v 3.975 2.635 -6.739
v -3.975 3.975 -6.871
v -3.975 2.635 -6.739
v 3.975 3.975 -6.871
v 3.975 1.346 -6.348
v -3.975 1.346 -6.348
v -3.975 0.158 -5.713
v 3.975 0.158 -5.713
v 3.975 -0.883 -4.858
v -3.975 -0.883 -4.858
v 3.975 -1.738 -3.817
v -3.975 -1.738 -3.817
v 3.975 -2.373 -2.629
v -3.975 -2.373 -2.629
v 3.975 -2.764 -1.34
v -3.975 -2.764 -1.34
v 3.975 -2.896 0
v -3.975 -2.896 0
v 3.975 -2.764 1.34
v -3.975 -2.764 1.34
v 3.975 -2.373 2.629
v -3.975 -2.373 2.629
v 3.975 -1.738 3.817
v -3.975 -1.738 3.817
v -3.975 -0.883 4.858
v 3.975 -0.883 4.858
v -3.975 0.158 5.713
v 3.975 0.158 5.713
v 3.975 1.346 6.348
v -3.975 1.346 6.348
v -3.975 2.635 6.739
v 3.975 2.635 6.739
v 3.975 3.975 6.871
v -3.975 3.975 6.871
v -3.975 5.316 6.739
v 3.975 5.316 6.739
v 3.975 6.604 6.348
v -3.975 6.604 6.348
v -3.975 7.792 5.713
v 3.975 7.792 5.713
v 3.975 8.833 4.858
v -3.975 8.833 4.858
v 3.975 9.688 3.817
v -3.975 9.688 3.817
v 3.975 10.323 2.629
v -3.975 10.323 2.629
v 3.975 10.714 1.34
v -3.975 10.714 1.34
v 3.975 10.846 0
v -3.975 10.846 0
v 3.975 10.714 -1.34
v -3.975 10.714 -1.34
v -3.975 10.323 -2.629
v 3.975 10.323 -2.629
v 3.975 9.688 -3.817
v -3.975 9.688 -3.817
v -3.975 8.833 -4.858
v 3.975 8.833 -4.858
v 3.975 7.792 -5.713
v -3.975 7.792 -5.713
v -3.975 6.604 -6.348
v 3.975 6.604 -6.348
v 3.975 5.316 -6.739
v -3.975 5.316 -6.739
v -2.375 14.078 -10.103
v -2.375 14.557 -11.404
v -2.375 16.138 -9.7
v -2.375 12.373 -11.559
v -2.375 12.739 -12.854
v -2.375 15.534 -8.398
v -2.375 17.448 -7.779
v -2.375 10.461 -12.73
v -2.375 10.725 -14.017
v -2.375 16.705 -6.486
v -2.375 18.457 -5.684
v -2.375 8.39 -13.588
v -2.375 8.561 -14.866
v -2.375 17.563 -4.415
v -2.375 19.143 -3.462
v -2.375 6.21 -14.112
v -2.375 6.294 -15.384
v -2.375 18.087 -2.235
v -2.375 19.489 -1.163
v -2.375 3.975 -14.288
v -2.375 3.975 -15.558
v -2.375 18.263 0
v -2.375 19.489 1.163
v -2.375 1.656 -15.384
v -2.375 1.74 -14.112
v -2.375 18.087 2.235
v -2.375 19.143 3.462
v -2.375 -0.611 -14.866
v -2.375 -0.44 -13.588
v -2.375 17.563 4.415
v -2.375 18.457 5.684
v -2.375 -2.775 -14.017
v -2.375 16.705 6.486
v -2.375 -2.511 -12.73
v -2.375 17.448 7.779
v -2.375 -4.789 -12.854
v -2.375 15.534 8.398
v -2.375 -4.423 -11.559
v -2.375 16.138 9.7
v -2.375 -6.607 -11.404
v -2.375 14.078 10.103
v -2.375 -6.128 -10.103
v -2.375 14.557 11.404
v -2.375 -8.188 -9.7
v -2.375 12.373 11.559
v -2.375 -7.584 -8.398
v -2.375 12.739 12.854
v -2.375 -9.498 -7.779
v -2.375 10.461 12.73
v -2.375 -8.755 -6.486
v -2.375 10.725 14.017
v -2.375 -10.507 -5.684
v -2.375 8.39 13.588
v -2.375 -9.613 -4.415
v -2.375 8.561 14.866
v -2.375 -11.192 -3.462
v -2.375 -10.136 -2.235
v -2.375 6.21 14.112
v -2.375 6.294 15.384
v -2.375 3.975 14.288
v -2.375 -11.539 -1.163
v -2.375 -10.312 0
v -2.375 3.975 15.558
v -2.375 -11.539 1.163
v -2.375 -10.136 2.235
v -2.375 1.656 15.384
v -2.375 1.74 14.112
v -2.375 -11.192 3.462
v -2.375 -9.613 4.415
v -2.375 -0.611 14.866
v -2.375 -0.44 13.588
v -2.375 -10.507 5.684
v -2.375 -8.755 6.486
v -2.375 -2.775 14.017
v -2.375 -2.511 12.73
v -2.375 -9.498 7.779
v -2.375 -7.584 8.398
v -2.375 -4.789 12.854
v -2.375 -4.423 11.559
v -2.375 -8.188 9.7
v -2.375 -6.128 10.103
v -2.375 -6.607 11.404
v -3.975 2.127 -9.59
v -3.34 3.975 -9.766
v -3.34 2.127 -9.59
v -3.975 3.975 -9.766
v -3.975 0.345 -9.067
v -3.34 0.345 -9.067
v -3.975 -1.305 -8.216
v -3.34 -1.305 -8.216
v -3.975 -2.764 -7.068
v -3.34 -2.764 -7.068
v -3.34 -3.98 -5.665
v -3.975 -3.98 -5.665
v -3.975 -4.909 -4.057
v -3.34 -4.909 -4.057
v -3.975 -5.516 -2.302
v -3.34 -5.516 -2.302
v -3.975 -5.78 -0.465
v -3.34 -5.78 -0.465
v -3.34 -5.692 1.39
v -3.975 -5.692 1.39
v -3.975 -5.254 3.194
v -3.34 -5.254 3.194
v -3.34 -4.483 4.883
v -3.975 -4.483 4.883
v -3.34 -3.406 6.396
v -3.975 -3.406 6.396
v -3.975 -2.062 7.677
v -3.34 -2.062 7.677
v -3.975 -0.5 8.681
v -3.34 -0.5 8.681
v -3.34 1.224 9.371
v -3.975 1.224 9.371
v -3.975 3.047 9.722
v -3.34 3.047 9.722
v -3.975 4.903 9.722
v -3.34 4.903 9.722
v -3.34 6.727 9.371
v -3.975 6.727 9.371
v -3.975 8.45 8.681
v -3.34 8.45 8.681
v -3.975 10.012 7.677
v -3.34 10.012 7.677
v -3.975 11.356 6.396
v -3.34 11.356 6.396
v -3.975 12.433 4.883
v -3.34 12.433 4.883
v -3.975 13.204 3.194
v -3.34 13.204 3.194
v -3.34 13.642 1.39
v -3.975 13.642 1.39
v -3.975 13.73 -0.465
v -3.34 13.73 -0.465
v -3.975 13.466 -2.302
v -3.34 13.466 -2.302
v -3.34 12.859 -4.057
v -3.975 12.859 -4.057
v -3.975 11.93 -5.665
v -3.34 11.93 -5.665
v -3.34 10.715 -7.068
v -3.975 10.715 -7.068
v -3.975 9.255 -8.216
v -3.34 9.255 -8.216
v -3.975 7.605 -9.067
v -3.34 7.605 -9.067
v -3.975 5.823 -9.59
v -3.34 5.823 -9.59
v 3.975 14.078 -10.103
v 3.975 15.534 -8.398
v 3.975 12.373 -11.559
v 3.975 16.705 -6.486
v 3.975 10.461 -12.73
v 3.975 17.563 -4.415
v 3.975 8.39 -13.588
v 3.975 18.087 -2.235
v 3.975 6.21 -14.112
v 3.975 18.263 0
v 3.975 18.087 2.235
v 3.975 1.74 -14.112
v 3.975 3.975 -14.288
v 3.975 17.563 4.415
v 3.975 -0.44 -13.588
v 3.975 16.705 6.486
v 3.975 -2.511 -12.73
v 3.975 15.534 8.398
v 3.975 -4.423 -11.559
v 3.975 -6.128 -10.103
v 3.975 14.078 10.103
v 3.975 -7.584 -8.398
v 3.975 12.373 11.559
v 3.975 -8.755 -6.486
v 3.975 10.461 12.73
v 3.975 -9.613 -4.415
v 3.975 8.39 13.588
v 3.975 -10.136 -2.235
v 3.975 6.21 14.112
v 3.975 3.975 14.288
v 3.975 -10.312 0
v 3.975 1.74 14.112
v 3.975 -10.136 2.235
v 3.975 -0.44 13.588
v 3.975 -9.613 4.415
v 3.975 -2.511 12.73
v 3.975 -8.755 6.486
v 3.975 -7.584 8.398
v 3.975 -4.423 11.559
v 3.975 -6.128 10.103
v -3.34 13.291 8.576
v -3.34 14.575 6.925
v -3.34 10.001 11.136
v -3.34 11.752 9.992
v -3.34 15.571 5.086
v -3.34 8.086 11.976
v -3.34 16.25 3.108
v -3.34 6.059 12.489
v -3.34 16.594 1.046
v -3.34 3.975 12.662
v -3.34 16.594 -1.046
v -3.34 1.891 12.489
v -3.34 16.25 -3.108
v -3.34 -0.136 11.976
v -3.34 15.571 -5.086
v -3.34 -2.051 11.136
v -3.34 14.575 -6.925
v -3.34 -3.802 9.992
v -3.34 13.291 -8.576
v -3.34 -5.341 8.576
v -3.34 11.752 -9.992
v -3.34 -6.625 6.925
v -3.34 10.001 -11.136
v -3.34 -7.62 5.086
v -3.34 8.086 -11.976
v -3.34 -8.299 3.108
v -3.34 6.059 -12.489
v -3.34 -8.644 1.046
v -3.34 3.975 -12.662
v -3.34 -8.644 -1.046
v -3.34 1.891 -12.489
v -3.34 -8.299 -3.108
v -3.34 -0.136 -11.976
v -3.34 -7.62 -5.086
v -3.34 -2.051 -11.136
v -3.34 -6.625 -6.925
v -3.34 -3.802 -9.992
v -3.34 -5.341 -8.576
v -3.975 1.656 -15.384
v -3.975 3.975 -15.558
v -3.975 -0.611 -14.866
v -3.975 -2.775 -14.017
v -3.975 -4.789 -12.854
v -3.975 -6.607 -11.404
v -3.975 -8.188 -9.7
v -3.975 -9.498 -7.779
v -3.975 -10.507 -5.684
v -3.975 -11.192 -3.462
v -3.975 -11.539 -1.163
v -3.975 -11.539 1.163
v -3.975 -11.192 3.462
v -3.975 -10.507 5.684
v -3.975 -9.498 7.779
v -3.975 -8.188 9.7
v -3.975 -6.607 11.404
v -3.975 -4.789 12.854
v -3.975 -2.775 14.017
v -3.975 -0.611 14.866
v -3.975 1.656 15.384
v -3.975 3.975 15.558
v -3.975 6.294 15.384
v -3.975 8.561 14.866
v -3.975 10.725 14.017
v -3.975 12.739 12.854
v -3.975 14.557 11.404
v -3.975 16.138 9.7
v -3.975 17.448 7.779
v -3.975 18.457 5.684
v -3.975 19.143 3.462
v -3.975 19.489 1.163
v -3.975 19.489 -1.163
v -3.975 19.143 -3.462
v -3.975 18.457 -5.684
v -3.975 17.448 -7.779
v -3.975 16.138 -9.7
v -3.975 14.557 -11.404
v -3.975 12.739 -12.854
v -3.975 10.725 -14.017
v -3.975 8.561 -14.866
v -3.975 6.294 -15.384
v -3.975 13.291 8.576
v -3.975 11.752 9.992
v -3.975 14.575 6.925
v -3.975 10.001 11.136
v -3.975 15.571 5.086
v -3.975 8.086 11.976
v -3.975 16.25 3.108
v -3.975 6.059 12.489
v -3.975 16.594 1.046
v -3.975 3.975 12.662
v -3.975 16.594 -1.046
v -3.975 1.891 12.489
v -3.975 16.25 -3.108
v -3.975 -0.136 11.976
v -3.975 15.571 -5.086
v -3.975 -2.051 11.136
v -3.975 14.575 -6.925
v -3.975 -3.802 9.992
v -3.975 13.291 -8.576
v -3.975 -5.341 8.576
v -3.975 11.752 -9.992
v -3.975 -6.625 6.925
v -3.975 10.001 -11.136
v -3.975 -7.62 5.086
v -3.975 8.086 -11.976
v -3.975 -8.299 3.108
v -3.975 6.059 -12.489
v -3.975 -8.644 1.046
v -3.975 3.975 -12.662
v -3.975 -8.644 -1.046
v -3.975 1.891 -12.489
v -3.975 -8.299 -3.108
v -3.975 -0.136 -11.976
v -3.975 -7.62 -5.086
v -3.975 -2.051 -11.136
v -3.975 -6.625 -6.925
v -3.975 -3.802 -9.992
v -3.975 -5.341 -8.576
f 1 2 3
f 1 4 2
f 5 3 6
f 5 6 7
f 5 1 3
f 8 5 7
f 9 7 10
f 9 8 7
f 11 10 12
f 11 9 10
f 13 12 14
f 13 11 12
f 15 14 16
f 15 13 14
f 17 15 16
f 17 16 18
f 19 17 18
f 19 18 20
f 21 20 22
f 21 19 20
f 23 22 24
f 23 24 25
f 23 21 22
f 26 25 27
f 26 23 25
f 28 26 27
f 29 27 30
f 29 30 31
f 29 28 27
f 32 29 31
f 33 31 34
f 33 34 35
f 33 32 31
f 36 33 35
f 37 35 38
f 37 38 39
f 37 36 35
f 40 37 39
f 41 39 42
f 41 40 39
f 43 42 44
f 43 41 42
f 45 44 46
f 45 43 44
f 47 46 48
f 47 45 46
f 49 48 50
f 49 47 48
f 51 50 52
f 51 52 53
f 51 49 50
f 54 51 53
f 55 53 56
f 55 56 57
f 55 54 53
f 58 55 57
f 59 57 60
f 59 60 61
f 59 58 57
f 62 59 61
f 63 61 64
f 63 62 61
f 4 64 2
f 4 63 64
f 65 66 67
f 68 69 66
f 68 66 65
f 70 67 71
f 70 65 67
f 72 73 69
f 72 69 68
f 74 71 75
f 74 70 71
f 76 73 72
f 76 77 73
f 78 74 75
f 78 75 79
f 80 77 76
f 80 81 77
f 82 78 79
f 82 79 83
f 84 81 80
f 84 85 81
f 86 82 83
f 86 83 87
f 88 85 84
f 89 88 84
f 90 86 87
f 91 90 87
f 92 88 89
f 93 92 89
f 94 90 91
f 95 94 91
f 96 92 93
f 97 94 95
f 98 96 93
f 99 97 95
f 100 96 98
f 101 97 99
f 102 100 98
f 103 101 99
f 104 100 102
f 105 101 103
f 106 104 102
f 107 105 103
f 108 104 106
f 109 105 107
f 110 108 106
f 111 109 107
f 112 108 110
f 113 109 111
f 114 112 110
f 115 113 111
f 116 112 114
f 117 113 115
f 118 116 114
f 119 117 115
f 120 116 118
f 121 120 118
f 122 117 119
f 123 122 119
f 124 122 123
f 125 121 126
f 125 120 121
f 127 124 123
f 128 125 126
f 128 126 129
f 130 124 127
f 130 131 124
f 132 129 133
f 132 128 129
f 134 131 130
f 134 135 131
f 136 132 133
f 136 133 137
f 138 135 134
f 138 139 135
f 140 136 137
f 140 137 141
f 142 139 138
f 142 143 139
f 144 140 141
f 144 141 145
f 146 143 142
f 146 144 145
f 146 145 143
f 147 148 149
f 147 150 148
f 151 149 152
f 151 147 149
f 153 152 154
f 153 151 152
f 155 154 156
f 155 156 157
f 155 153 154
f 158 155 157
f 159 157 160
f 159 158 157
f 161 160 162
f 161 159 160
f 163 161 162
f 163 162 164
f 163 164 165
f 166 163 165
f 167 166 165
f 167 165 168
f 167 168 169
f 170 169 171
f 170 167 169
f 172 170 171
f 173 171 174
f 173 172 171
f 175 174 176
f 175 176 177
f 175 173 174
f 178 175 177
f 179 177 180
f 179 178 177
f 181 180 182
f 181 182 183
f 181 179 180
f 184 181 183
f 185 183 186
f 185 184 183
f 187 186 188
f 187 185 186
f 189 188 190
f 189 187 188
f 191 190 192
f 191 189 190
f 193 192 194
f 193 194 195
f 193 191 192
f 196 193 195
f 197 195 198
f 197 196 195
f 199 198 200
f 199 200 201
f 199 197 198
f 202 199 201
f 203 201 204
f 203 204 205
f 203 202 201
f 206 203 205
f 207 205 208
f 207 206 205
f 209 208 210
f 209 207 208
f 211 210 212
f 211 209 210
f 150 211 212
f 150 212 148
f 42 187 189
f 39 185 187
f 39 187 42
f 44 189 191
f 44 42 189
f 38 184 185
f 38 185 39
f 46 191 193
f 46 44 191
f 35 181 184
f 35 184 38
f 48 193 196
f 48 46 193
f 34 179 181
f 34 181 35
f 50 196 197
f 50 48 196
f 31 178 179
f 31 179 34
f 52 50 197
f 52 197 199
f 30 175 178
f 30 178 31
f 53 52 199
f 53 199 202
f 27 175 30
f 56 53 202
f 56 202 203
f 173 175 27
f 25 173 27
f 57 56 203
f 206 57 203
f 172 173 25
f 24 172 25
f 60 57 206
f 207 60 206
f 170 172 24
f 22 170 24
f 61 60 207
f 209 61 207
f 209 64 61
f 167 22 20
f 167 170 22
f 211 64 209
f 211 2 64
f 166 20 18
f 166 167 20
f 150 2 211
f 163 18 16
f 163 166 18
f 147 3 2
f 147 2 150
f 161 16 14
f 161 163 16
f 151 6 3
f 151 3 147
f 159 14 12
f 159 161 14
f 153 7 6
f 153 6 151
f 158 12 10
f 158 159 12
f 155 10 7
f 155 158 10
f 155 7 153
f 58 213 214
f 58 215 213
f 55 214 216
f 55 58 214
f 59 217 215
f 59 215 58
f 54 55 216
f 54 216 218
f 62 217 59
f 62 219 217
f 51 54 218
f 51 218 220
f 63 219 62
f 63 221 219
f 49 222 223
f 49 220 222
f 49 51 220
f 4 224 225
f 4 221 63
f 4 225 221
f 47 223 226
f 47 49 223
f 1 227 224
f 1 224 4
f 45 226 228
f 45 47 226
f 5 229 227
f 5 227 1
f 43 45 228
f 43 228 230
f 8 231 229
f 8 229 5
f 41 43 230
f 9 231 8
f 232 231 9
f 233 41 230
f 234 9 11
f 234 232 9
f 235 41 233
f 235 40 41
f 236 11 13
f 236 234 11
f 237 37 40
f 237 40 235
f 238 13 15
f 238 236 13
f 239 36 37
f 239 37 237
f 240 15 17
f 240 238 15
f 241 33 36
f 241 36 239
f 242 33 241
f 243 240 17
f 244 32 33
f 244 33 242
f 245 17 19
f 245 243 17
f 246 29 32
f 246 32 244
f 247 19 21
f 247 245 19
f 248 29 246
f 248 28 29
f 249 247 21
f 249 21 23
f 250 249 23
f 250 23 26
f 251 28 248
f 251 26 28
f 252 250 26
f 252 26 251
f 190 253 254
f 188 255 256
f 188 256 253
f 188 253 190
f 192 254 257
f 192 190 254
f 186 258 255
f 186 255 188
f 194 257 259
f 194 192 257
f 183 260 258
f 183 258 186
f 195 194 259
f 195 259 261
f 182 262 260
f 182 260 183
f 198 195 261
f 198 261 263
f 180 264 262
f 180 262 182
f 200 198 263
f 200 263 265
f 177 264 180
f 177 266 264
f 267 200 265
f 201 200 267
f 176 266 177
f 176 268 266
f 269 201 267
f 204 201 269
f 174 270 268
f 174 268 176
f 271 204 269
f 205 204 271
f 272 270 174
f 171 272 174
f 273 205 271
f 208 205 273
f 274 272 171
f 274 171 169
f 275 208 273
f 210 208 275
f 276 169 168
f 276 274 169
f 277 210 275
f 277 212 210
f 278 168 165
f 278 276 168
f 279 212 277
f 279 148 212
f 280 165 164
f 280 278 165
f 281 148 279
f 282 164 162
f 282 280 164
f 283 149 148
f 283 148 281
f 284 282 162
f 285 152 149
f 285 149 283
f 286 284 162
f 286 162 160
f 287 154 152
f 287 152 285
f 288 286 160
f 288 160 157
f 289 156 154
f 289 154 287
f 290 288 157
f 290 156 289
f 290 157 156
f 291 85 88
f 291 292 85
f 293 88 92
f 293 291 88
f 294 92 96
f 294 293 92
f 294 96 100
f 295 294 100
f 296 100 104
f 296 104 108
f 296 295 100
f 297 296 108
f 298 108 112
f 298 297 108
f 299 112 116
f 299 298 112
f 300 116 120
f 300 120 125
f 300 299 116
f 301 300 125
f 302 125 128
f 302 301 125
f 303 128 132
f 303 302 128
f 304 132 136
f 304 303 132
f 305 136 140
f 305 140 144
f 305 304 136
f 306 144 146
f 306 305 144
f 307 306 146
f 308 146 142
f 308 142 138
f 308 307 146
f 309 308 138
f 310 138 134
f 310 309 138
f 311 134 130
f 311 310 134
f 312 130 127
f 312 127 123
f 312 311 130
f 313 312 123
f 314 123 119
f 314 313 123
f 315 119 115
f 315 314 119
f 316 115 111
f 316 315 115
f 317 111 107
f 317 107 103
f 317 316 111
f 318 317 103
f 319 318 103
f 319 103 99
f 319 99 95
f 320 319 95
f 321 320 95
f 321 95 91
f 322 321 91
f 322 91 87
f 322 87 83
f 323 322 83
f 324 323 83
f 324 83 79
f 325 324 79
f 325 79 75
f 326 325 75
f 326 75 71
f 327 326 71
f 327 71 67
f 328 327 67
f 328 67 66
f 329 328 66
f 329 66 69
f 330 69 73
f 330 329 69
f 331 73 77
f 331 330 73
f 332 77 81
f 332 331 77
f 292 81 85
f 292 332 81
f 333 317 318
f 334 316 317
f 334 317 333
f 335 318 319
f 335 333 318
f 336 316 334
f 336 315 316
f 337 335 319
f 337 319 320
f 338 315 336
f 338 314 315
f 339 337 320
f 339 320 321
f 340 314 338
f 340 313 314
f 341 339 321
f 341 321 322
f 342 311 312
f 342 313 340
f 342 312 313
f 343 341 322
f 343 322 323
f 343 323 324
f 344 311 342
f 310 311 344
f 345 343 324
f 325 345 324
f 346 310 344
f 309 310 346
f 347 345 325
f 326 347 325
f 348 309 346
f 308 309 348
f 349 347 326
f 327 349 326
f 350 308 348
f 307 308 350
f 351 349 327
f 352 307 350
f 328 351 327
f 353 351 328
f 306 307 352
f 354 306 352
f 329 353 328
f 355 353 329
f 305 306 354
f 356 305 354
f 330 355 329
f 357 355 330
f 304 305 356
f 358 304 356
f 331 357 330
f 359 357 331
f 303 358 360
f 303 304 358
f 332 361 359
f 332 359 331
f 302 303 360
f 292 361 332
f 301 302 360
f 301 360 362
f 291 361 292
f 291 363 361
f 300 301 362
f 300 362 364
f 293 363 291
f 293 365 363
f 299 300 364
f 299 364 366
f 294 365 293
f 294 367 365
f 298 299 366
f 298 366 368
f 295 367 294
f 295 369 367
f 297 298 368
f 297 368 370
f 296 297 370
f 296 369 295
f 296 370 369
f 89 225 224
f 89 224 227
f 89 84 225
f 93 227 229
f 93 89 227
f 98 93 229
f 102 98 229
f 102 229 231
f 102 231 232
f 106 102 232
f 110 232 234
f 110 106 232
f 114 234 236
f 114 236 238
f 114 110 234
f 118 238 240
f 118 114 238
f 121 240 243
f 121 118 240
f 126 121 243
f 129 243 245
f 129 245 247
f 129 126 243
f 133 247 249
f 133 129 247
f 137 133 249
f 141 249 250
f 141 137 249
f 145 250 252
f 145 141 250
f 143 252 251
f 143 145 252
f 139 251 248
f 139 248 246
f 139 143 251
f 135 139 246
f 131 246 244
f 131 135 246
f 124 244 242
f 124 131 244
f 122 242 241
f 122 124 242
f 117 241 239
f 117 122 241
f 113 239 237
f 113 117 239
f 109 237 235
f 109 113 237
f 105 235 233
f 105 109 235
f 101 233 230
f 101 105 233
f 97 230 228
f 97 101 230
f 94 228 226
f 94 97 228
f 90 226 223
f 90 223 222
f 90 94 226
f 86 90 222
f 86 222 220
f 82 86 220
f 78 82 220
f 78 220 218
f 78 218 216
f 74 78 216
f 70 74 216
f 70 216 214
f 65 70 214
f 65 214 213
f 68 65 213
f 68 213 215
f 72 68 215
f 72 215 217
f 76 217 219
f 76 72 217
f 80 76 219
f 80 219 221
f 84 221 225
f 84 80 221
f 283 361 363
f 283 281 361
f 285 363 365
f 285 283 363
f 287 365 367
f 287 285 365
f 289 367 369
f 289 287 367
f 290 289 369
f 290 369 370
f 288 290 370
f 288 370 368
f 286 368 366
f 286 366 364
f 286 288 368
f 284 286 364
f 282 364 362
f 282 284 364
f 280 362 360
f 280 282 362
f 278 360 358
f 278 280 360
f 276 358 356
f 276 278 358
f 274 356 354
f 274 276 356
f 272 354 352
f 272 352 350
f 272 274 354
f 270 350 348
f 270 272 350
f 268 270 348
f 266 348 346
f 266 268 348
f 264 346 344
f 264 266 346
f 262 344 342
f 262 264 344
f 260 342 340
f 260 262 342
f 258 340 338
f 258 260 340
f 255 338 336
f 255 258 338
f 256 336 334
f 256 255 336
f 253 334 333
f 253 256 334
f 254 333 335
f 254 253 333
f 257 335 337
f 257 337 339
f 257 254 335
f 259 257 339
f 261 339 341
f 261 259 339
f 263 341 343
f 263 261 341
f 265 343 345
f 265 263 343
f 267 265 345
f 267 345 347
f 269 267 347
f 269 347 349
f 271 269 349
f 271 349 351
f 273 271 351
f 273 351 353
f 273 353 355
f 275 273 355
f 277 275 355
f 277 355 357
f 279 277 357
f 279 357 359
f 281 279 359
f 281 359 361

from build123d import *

# Parameters (mm, degrees)
BODY_MOVE_COPY1_ANGLE = 90


with BuildPart() as part:
    # Sketch5 → Revolve1 (revolve)
    with BuildSketch(Plane.XY, mode=Mode.PRIVATE) as revolve1_sk:
        Polygon((6.8707, 7.9502), (6.8707, 0), (14.2875, 0), (14.2875, 6.35), (15.5575, 6.35), (15.5575, 7.9502), (12.6619, 7.9502), (12.6619, 7.3152), (9.7663, 7.3152), (9.7663, 7.9502), align=None)
    revolve(revolve1_sk.sketch.rotate(Axis((0, 0, 0), (0, 1, 0)), 90), axis=Axis((0, 0, 0), (0, 1, 0)))


with BuildPart() as part_1:
    # Body-Move/Copy1: moved
    add(part.part.rotate(Axis((0, 3.9751, 0), (0, 0, 1)), BODY_MOVE_COPY1_ANGLE))


solid = part_1.part
